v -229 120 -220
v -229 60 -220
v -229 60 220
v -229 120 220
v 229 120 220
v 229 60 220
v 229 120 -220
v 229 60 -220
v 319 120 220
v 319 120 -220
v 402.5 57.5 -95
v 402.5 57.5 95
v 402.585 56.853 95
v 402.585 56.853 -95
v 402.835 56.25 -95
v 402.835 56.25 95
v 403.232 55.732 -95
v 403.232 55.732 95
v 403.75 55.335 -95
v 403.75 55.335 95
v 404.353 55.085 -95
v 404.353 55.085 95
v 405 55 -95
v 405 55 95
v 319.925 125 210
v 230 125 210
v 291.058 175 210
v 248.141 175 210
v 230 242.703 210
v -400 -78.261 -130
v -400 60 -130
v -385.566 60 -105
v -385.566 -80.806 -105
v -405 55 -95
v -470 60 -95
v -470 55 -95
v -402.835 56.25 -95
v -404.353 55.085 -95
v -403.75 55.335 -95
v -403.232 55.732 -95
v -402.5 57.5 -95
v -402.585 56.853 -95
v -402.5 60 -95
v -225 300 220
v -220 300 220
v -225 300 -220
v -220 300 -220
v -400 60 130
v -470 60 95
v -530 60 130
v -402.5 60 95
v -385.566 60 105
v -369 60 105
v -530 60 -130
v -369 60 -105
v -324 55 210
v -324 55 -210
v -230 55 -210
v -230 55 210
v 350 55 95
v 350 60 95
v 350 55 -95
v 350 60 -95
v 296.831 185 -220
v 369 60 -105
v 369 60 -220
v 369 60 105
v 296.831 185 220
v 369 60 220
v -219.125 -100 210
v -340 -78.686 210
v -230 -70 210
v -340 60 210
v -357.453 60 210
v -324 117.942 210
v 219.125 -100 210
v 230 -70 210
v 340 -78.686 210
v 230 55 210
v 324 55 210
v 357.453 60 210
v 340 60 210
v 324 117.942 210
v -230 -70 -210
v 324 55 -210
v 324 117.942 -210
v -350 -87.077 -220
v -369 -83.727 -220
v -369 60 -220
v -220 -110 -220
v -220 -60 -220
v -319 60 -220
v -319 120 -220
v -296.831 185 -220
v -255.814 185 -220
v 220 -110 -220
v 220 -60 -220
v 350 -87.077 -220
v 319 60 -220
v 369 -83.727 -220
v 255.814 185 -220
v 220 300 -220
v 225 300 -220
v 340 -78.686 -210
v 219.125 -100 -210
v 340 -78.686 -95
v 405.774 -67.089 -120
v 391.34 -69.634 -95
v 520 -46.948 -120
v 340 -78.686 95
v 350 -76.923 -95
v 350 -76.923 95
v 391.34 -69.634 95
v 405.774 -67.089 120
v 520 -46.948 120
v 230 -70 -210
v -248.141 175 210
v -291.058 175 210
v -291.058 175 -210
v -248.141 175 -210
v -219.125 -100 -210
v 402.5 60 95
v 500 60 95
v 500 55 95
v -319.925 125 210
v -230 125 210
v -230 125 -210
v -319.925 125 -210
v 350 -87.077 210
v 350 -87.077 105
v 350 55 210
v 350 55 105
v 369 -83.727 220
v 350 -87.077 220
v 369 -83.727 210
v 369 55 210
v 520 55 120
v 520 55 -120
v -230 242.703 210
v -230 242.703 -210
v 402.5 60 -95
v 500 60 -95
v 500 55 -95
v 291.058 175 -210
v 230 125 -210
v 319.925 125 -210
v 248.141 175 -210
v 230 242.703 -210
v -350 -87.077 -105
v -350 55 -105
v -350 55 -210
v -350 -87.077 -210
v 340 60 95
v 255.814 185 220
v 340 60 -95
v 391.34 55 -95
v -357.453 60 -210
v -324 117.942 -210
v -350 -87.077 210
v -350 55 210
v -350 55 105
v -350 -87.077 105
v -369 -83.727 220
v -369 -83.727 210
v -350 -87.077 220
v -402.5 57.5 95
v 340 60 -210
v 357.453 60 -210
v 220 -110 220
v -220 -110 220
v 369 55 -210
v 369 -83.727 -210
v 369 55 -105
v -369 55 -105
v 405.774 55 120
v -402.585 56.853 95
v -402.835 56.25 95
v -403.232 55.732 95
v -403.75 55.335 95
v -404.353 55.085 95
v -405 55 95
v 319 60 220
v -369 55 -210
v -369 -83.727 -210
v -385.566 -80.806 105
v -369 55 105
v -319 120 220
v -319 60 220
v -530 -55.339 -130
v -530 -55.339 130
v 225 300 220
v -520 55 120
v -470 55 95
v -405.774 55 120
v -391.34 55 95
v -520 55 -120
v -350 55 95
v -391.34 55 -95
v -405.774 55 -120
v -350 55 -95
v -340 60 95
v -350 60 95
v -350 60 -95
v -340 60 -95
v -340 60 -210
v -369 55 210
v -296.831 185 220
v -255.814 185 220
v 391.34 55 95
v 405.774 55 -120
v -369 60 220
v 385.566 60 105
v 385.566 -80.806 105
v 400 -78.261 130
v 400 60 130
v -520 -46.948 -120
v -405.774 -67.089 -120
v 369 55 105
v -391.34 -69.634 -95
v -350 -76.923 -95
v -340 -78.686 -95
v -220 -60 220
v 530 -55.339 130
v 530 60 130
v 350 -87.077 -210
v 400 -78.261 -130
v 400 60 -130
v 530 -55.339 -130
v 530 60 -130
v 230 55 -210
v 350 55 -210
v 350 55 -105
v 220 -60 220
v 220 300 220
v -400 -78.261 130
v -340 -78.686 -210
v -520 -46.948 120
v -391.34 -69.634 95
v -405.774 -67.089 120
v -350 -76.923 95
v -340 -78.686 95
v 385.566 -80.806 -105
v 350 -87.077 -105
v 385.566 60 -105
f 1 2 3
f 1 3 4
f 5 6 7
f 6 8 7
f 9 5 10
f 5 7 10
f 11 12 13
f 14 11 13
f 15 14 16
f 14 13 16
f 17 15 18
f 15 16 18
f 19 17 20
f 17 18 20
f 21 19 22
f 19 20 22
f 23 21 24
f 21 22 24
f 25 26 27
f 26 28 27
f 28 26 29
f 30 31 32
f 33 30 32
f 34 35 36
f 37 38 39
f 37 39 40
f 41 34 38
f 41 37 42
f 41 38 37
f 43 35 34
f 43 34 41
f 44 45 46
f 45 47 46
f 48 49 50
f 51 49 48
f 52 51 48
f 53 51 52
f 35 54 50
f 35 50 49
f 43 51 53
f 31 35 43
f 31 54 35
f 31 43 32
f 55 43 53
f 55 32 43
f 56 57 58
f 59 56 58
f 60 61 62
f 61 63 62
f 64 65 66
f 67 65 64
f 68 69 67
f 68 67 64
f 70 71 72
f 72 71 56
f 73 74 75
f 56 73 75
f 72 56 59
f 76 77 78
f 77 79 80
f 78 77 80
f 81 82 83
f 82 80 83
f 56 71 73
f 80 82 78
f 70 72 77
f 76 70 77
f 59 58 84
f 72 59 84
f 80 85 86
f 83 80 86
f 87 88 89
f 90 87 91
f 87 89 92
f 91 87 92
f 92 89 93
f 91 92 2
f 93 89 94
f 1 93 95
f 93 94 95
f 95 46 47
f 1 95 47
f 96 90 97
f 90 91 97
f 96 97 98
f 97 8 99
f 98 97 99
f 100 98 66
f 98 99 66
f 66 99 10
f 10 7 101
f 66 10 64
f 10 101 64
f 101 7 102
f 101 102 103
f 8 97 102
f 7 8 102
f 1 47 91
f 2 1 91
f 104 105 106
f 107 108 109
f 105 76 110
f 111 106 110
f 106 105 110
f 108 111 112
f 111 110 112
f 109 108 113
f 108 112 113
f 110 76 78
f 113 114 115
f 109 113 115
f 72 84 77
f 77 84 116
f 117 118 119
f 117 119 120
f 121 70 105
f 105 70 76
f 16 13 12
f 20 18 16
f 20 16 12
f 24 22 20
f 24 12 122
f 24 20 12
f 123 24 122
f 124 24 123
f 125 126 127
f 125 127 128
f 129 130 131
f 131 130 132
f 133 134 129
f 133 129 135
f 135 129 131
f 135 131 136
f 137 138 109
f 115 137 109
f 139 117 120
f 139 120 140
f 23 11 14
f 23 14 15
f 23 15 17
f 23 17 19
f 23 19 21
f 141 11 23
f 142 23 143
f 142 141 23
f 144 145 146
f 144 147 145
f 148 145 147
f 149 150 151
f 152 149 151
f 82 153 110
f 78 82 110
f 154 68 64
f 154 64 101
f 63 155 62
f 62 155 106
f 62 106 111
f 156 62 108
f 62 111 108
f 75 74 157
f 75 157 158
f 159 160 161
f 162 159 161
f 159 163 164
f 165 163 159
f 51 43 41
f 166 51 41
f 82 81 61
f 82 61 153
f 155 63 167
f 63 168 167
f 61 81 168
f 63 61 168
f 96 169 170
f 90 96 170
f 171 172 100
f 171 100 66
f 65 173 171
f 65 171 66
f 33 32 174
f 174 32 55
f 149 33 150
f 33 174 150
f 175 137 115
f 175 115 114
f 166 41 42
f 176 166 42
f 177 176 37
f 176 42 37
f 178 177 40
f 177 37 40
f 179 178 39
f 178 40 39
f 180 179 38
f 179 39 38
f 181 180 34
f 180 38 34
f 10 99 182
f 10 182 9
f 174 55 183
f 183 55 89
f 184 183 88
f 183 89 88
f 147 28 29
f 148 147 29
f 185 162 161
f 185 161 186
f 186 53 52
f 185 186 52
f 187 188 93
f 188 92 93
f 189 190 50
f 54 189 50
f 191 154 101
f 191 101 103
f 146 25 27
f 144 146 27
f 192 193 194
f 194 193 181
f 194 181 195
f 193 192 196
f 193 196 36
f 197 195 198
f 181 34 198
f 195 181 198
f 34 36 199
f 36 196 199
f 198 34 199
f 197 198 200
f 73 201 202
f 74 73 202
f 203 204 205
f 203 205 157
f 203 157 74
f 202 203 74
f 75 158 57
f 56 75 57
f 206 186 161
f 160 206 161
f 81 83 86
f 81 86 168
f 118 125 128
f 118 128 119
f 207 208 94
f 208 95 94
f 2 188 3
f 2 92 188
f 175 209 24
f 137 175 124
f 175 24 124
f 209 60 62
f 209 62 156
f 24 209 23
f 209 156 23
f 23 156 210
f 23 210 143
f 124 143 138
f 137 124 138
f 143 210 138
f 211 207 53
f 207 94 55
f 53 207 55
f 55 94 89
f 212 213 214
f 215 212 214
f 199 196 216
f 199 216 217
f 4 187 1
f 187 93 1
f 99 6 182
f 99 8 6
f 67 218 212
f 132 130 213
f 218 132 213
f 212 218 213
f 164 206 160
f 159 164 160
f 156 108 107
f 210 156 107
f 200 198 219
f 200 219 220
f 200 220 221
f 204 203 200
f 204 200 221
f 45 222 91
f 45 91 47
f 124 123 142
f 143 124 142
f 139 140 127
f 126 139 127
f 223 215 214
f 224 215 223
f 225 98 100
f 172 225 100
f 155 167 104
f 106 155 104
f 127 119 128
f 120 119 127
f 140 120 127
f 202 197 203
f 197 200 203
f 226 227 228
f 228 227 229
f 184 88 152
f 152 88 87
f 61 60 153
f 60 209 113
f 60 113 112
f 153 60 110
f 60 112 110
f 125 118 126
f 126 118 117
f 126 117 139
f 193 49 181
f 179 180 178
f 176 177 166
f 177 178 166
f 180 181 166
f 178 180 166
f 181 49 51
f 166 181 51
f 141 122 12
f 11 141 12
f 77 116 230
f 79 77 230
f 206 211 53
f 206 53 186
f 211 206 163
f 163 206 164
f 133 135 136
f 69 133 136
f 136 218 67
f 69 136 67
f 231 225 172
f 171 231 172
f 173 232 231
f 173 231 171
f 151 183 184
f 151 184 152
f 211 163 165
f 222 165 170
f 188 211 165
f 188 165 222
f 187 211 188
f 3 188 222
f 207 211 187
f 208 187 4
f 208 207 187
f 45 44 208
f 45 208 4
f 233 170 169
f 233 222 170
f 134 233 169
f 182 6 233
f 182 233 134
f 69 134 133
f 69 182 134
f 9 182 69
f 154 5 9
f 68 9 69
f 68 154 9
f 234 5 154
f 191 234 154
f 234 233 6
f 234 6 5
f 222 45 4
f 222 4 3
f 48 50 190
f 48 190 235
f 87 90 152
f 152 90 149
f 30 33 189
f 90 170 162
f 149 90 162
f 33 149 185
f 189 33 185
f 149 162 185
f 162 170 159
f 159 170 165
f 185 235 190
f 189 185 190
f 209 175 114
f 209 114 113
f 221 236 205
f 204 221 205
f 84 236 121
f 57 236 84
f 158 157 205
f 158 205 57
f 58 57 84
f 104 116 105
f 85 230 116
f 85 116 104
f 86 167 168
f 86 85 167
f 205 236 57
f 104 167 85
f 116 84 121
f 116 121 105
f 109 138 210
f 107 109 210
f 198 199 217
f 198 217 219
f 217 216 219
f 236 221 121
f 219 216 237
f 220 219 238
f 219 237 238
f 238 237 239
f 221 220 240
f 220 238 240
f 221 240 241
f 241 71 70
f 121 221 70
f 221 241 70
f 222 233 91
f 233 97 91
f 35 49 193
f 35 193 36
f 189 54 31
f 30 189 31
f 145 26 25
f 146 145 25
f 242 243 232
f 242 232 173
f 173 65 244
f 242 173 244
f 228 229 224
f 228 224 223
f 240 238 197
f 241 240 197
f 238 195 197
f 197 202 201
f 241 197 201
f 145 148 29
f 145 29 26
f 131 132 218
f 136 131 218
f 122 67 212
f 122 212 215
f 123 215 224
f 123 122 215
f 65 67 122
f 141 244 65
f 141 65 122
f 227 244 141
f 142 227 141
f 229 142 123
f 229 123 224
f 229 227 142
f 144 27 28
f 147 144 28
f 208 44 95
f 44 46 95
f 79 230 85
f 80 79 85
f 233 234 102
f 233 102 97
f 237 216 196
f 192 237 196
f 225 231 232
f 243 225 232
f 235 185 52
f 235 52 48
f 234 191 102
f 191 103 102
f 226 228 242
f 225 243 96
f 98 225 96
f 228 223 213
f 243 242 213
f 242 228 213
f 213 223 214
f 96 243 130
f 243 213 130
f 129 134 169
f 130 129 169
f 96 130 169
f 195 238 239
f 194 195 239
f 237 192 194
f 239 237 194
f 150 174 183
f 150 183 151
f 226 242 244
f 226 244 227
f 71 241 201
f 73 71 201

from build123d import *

# Parameters (mm, degrees)
EXTRUDE_1_DEPTH                 = 220
SKETCH_3_W                      = 130
SKETCH_3_H                      = 90
CUT_EXTRUDE_1_DEPTH             = 585.29444632
EXTRUDE_5_DEPTH                 = 10
EXTRUDE_START                   = -130
EXTRUDE_6_DEPTH                 = 260
EXTRUDE_START_2                 = -220
EXTRUDE_6_2_DEPTH               = 125
EXTRUDE_START_3                 = 95
EXTRUDE_6_3_DEPTH               = 125
EXTRUDE_START_4                 = -76.923226389
EXTRUDE_6_4_DEPTH               = 136.923226389
CUT_EXTRUDE_2_DEPTH             = 585.29444632
SKETCH_13_W                     = 90
SKETCH_13_H                     = 60
EXTRUDE_7_DEPTH                 = 10
EXTRUDE_10_REACH                = 649.534
SKETCH_16_W                     = 90
SKETCH_16_H                     = 60
EXTRUDE_10_DIRECTION_2_REACH    = 649.534
SKETCH_17_W                     = 65
SKETCH_17_H                     = 190
SKETCH_17_W_2                   = 95
EXTRUDE_15_DEPTH                = 5
CUT_EXTRUDE_3_REACH             = 649.534
CUT_EXTRUDE_3_DIRECTION_2_REACH = 649.534


with BuildPart() as part:
    # Эскиз1 → Бобышка-Вытянуть1 (new, symmetric)
    with BuildSketch(Plane.XY):
        Polygon((-219.125113365, -100), (219.125113365, -100), (530, -45.184369862), (530, -55.33863598), (220, -110), (-220, -110), (-530, -55.33863598), (-530, -45.184369862), align=None)
    extrude(amount=EXTRUDE_1_DEPTH, both=True)

    # Эскиз3 → Вырез-Вытянуть1 (cut, through all)
    with BuildSketch(Plane(origin=(0, 0, 0), x_dir=(1, 0, 0), z_dir=(0, 1, 0))):
        with Locations((-465, 175)):
            Rectangle(SKETCH_3_W, SKETCH_3_H)
        with Locations((465, 175)):
            Rectangle(SKETCH_3_W, SKETCH_3_H)
        with Locations((465, -175)):
            Rectangle(SKETCH_3_W, SKETCH_3_H)
        with Locations((-465, -175)):
            Rectangle(SKETCH_3_W, SKETCH_3_H)
    extrude(amount=-CUT_EXTRUDE_1_DEPTH, mode=Mode.SUBTRACT)

    # Эскиз9 → Бобышка-Вытянуть5 (add)
    with BuildSketch(Plane.XY.offset(130)):
        Polygon((-530, -45.184369862), (-400, -68.106877354), (-400, 60), (-530, 60), align=None)
        Polygon((400, -68.106877354), (400, 60), (530, 60), (530, -45.184369862), align=None)
    extrude_5 = extrude(amount=-EXTRUDE_5_DEPTH)

    # Зеркальное отражение3: Бобышка-Вытянуть5 across plane
    add(extrude_5.mirror(Plane.XY))

    # Бобышка-Вытянуть6: read off the stored shape, not the designer's step
    # Бобышка-Вытянуть6 outline → Бобышка-Вытянуть6 (add)
    with BuildSketch(Plane.XY.offset(EXTRUDE_START)):
        Polygon((-530, 60), (-530, -45.184369862), (-520, -46.947639669), (-520, 60), align=None)
        Polygon((530, -45.184369862), (530, 60), (520, 60), (520, -46.947639669), align=None)
    extrude(amount=EXTRUDE_6_DEPTH)

    # Extrude 6 2 outline → Extrude 6 2 (add)
    with BuildSketch(Plane.XY.offset(EXTRUDE_START_2)):
        Polygon((-350, 60), (-350, -76.923226389), (-340, -78.686496196), (-340, 60), align=None)
        Polygon((350, -76.923226389), (350, 60), (340, 60), (340, -78.686496196), align=None)
    extrude(amount=EXTRUDE_6_2_DEPTH)

    # Extrude 6 3 outline → Extrude 6 3 (add)
    with BuildSketch(Plane.XY.offset(EXTRUDE_START_3)):
        Polygon((-350, 60), (-350, -76.923226389), (-340, -78.686496196), (-340, 60), align=None)
        Polygon((350, -76.923226389), (350, 60), (340, 60), (340, -78.686496196), align=None)
    extrude(amount=EXTRUDE_6_3_DEPTH)

    # Extrude 6 4 outline → Extrude 6 4 (add)
    with BuildSketch(Plane(origin=(0, 0, 0), x_dir=(1, 0, 0), z_dir=(0, 1, 0)).offset(EXTRUDE_START_4)):
        Polygon((350, -105), (385.56624327, -105), (400, -130), (400, -120), (405.773502692, -120), (391.339745962, -95), (350, -95), align=None)
        Polygon((-400, -130), (-385.56624327, -105), (-350, -105), (-350, -95), (-391.339745962, -95), (-405.773502692, -120), (-400, -120), align=None)
        Polygon((-400, 120), (-405.773502692, 120), (-391.339745962, 95), (-350, 95), (-350, 105), (-385.56624327, 105), (-400, 130), align=None)
        Polygon((400, 130), (385.56624327, 105), (350, 105), (350, 95), (391.339745962, 95), (405.773502692, 120), (400, 120), align=None)
    extrude(amount=EXTRUDE_6_4_DEPTH)

    # Эскиз12 → Вырез-Вытянуть2 (cut, through all)
    with BuildSketch(Plane(origin=(0, 0, 0), x_dir=(1, 0, 0), z_dir=(0, 1, 0))):
        Polygon((350, -105), (350, -220), (400, -220), (400, -130), (385.56624327, -105), align=None)
        Polygon((400, 220), (350, 220), (350, 105), (385.56624327, 105), (400, 130), align=None)
        Polygon((-400, -220), (-350, -220), (-350, -105), (-385.56624327, -105), (-400, -130), align=None)
        Polygon((-400, 130), (-385.56624327, 105), (-350, 105), (-350, 220), (-400, 220), align=None)
    extrude(amount=-CUT_EXTRUDE_2_DEPTH, mode=Mode.SUBTRACT)

    # Эскиз13 → Бобышка-Вытянуть7 (add)
    # profile 1 of 2: a face of its own
    with BuildSketch(Plane.XY.offset(220)):
        Polygon((-296.831216351, 185), (-369, 60), (-369, -83.727279874), (-350, -87.077492508), (-350, 60), (-340, 60), (-340, -78.686496196), (-219.125113365, -100), (219.125113365, -100), (340, -78.686496196), (340, 60), (350, 60), (350, -87.077492508), (369, -83.727279874), (369, 60), (296.831216351, 185), (255.81415713, 185), (225, 300), (220, 300), (220, -60), (-220, -60), (-220, 300), (-225, 300), (-255.81415713, 185), align=None)
        with Locations((-274, 90)):
            Rectangle(SKETCH_13_W, SKETCH_13_H, mode=Mode.SUBTRACT)
        with Locations((274, 90)):
            Rectangle(SKETCH_13_W, SKETCH_13_H, mode=Mode.SUBTRACT)
    # profile 2 of 2: a face of its own
    with BuildSketch(Plane.XY.offset(220)):
        Polygon((-350, 60), (-350, -87.077492508), (-220, -110), (220, -110), (350, -87.077492508), (350, 60), (340, 60), (340, -78.686496196), (219.125113365, -100), (-219.125113365, -100), (-340, -78.686496196), (-340, 60), align=None)
    extrude_7 = extrude(amount=-EXTRUDE_7_DEPTH)

    # Зеркальное отражение4: Бобышка-Вытянуть7 across plane
    add(extrude_7.mirror(Plane.XY))

    # Эскиз16 → Бобышка-Вытянуть10 (add, up to next)
    with BuildSketch(Plane.XY, mode=Mode.PRIVATE) as extrude_10_sk1:
        Polygon((369, 60), (296.831216351, 185), (255.81415713, 185), (225, 300), (220, 300), (220, -60), (-220, -60), (-220, 300), (-225, 300), (-255.81415713, 185), (-296.831216351, 185), (-369, 60), (-369, 55), (-359, 55), (-350, 55), (-350, 60), (-357.452994616, 60), (-324, 117.942286341), (-324, 55), (-230, 55), (-230, -70), (230, -70), (230, 55), (324, 55), (324, 117.942286341), (357.452994616, 60), (350, 60), (350, 55), (359, 55), (369, 55), align=None)
        Polygon((-291.057713659, 175), (-248.14088725, 175), (-230, 242.702712911), (-230, 125), (-319.925227119, 125), align=None, mode=Mode.SUBTRACT)
        Polygon((230, 242.702712911), (230, 125), (319.925227119, 125), (291.057713659, 175), (248.14088725, 175), align=None, mode=Mode.SUBTRACT)
        with Locations((-274, 90)):
            Rectangle(SKETCH_16_W, SKETCH_16_H, mode=Mode.SUBTRACT)
        with Locations((274, 90)):
            Rectangle(SKETCH_16_W, SKETCH_16_H, mode=Mode.SUBTRACT)
    extrude_10_tool1 = extrude(extrude_10_sk1.sketch, amount=EXTRUDE_10_REACH, mode=Mode.PRIVATE) - part.part
    add(extrude_10_tool1.solids().sort_by_distance((325.766077, 118.372216, 0))[0])

    # Эскиз16 → Бобышка-Вытянуть10 direction 2 (add, up to next)
    with BuildSketch(Plane.XY, mode=Mode.PRIVATE) as extrude_10_direction_2_sk1:
        Polygon((369, 60), (296.831216351, 185), (255.81415713, 185), (225, 300), (220, 300), (220, -60), (-220, -60), (-220, 300), (-225, 300), (-255.81415713, 185), (-296.831216351, 185), (-369, 60), (-369, 55), (-359, 55), (-350, 55), (-350, 60), (-357.452994616, 60), (-324, 117.942286341), (-324, 55), (-230, 55), (-230, -70), (230, -70), (230, 55), (324, 55), (324, 117.942286341), (357.452994616, 60), (350, 60), (350, 55), (359, 55), (369, 55), align=None)
        Polygon((-291.057713659, 175), (-248.14088725, 175), (-230, 242.702712911), (-230, 125), (-319.925227119, 125), align=None, mode=Mode.SUBTRACT)
        Polygon((230, 242.702712911), (230, 125), (319.925227119, 125), (291.057713659, 175), (248.14088725, 175), align=None, mode=Mode.SUBTRACT)
        with Locations((-274, 90)):
            Rectangle(SKETCH_16_W, SKETCH_16_H, mode=Mode.SUBTRACT)
        with Locations((274, 90)):
            Rectangle(SKETCH_16_W, SKETCH_16_H, mode=Mode.SUBTRACT)
    extrude_10_direction_2_tool1 = extrude(extrude_10_direction_2_sk1.sketch, amount=-EXTRUDE_10_DIRECTION_2_REACH, mode=Mode.PRIVATE) - part.part
    add(extrude_10_direction_2_tool1.solids().sort_by_distance((325.766077, 118.372216, 0))[0])

    # Эскиз17 → Бобышка-Вытянуть15 (add)
    # profile 1 of 2: a face of its own
    with BuildSketch(Plane(origin=(0, 60, 0), x_dir=(1, 0, 0), z_dir=(0, 1, 0))):
        Polygon((-391.339745962, -95), (-369, -95), (-369, 95), (-391.339745962, 95), (-405.773502692, 120), (-520, 120), (-520, -120), (-405.773502692, -120), align=None)
        with Locations((-437.5, 0)):
            Rectangle(SKETCH_17_W, SKETCH_17_H, mode=Mode.SUBTRACT)
    # profile 2 of 2: a face of its own
    with BuildSketch(Plane(origin=(0, 60, 0), x_dir=(1, 0, 0), z_dir=(0, 1, 0))):
        Polygon((385.56624327, 105), (369, 105), (369, -105), (385.56624327, -105), (400, -130), (530, -130), (530, 130), (400, 130), align=None)
        with Locations((452.5, 0)):
            Rectangle(SKETCH_17_W_2, SKETCH_17_H, mode=Mode.SUBTRACT)
    extrude(amount=-EXTRUDE_15_DEPTH)

    # Вырез-Вытянуть3: up to this face of the body (flat: up to its plane)
    cut_extrude_3_end = Plane(part.part.faces().sort_by_distance((-437.5, 57.5, -95))[0])
    # Эскиз18 → Вырез-Вытянуть3 (cut, up to the picked face)
    with BuildSketch(Plane.XY, mode=Mode.PRIVATE) as cut_extrude_3_sk1:
        with BuildLine():
            Line((-405, 55), (-405, 60))
            Line((-405, 60), (-402.5, 60))
            Line((-402.5, 60), (-402.5, 57.5))
            ThreePointArc((-402.5, 57.5), (-403.232233047, 55.732233047), (-405, 55))
        make_face()
    cut_extrude_3_tool1 = split(extrude(cut_extrude_3_sk1.sketch, amount=-CUT_EXTRUDE_3_REACH, mode=Mode.PRIVATE), bisect_by=cut_extrude_3_end, keep=Keep.BOTH, mode=Mode.PRIVATE)
    # Эскиз18 → Вырез-Вытянуть3 (cut, up to the picked face)
    with BuildSketch(Plane.XY, mode=Mode.PRIVATE) as cut_extrude_3_sk2:
        with BuildLine():
            Line((405, 55), (405, 60))
            Line((405, 60), (402.5, 60))
            Line((402.5, 60), (402.5, 57.5))
            ThreePointArc((402.5, 57.5), (403.232233047, 55.732233047), (405, 55))
        make_face()
    cut_extrude_3_tool2 = split(extrude(cut_extrude_3_sk2.sketch, amount=-CUT_EXTRUDE_3_REACH, mode=Mode.PRIVATE), bisect_by=cut_extrude_3_end, keep=Keep.BOTH, mode=Mode.PRIVATE)
    add(cut_extrude_3_tool1.solids().sort_by(Axis((-403.833127, 57.733375, 0), (0, 0, -1)))[0], mode=Mode.SUBTRACT)
    add(cut_extrude_3_tool2.solids().sort_by(Axis((403.833127, 57.733375, 0), (0, 0, -1)))[0], mode=Mode.SUBTRACT)

    # Вырез-Вытянуть3 direction 2: up to this face of the body (flat: up to its plane)
    cut_extrude_3_direction_2_end = Plane(part.part.faces().sort_by_distance((-437.5, 57.5, 95))[0])
    # Эскиз18 → Вырез-Вытянуть3 direction 2 (cut, up to the picked face)
    with BuildSketch(Plane.XY, mode=Mode.PRIVATE) as cut_extrude_3_direction_2_sk1:
        with BuildLine():
            Line((-405, 55), (-405, 60))
            Line((-405, 60), (-402.5, 60))
            Line((-402.5, 60), (-402.5, 57.5))
            ThreePointArc((-402.5, 57.5), (-403.232233047, 55.732233047), (-405, 55))
        make_face()
    cut_extrude_3_direction_2_tool1 = split(extrude(cut_extrude_3_direction_2_sk1.sketch, amount=CUT_EXTRUDE_3_DIRECTION_2_REACH, mode=Mode.PRIVATE), bisect_by=cut_extrude_3_direction_2_end, keep=Keep.BOTH, mode=Mode.PRIVATE)
    # Эскиз18 → Вырез-Вытянуть3 direction 2 (cut, up to the picked face)
    with BuildSketch(Plane.XY, mode=Mode.PRIVATE) as cut_extrude_3_direction_2_sk2:
        with BuildLine():
            Line((405, 55), (405, 60))
            Line((405, 60), (402.5, 60))
            Line((402.5, 60), (402.5, 57.5))
            ThreePointArc((402.5, 57.5), (403.232233047, 55.732233047), (405, 55))
        make_face()
    cut_extrude_3_direction_2_tool2 = split(extrude(cut_extrude_3_direction_2_sk2.sketch, amount=CUT_EXTRUDE_3_DIRECTION_2_REACH, mode=Mode.PRIVATE), bisect_by=cut_extrude_3_direction_2_end, keep=Keep.BOTH, mode=Mode.PRIVATE)
    add(cut_extrude_3_direction_2_tool1.solids().sort_by(Axis((-403.833127, 57.733375, 0), (0, 0, 1)))[0], mode=Mode.SUBTRACT)
    add(cut_extrude_3_direction_2_tool2.solids().sort_by(Axis((403.833127, 57.733375, 0), (0, 0, 1)))[0], mode=Mode.SUBTRACT)


solid = part.part
